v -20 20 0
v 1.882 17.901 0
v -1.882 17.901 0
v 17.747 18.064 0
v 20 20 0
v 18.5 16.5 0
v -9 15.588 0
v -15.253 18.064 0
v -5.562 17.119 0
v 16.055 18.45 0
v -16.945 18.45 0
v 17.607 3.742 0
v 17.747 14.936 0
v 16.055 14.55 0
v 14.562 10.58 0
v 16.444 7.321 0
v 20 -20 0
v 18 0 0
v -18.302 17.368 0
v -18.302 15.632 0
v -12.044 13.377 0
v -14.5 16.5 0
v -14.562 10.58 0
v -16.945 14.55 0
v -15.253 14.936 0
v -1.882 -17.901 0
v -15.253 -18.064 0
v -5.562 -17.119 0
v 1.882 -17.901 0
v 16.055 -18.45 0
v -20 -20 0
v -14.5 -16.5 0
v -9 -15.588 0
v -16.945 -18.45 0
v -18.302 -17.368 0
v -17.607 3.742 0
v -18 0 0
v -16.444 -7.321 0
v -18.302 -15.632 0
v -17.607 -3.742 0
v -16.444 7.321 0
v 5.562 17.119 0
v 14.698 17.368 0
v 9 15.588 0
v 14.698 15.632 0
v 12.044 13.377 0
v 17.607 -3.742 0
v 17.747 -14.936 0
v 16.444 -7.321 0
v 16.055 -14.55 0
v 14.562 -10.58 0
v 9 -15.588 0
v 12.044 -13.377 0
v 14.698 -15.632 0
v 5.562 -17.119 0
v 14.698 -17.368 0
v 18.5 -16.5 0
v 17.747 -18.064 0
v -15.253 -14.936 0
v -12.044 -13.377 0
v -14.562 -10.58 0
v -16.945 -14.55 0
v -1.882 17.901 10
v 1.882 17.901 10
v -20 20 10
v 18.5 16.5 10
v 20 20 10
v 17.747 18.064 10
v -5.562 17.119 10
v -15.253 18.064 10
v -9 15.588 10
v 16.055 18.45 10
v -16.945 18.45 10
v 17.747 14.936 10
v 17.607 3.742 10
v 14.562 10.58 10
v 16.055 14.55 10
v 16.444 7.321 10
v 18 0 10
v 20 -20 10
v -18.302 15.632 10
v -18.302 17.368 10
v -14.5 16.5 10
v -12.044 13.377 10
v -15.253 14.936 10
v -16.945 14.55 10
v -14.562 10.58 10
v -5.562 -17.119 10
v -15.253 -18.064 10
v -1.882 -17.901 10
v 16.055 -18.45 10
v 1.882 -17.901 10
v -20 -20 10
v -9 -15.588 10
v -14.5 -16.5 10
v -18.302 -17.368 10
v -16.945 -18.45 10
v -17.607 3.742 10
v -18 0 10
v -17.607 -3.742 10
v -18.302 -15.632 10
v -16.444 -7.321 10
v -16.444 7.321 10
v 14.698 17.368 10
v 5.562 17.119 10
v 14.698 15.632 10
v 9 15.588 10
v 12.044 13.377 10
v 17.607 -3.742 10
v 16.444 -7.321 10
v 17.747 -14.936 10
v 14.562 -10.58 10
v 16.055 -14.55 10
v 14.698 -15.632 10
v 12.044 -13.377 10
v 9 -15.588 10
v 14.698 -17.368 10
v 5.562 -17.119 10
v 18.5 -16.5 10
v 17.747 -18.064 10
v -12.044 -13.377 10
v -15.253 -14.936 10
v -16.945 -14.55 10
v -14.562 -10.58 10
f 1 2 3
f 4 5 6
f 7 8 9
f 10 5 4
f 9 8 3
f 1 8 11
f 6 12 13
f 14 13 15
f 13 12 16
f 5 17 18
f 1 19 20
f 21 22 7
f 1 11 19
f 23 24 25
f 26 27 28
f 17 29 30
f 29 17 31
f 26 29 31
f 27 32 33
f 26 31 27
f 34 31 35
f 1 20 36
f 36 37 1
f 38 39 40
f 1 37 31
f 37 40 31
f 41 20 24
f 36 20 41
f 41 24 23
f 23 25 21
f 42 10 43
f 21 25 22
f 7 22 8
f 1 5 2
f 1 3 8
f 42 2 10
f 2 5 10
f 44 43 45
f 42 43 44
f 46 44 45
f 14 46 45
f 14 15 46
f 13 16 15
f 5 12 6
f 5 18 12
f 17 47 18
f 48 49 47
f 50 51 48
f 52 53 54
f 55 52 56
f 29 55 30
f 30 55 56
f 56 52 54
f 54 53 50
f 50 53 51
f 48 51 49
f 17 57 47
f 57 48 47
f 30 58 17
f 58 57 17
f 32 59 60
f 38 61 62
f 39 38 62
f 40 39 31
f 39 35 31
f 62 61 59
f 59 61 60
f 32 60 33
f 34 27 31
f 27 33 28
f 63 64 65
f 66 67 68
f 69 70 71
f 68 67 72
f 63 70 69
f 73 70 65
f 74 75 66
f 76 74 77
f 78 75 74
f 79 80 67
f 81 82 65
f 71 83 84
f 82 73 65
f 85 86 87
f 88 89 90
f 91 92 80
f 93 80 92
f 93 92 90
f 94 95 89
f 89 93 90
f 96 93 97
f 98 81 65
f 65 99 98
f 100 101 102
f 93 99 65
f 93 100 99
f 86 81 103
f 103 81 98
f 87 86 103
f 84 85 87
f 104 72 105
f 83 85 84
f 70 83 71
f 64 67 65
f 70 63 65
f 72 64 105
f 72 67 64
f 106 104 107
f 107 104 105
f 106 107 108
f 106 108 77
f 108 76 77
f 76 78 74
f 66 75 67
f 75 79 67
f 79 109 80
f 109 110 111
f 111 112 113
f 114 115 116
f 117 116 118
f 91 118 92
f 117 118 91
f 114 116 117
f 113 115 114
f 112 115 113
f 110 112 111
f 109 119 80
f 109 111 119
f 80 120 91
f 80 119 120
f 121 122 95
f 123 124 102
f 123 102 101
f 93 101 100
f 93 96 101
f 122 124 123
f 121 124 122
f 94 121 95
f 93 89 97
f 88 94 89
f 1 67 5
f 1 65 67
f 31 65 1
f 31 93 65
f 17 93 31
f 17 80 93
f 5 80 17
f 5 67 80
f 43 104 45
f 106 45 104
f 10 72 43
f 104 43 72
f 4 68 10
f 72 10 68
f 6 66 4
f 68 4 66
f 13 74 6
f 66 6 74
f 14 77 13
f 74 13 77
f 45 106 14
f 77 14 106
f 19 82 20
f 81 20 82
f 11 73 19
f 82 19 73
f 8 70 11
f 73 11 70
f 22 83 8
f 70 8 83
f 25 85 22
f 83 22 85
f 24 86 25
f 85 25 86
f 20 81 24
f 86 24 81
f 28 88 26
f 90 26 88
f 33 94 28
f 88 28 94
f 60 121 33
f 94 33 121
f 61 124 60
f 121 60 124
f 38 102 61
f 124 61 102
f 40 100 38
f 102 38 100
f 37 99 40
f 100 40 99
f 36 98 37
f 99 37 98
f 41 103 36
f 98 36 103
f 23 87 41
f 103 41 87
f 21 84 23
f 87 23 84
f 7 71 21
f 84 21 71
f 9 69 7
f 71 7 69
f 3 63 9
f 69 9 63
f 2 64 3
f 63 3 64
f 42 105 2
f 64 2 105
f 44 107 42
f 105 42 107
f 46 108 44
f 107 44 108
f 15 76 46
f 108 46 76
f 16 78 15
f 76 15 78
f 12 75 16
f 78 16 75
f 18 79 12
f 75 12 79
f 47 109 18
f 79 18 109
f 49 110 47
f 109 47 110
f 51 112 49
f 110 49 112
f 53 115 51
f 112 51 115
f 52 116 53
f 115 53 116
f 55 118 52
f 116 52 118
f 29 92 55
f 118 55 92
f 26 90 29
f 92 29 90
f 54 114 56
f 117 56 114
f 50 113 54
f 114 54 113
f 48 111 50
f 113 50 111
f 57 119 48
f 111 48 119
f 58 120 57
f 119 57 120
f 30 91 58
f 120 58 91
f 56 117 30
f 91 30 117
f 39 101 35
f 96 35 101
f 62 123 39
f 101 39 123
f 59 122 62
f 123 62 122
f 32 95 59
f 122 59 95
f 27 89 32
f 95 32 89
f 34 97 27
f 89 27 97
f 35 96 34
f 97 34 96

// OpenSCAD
echo(version=version());

color("gray")

        linear_extrude(height = 10)
        difference(){
            square([40, 40], center = true);
            circle(18, center = true);
            translate([16.5, -16.5, 0])circle(2, center = true);
            translate([16.5, 16.5, 0])circle(2, center = true);
            translate([-16.5, 16.5, 0])circle(2, center = true);
            translate([-16.5, -16.5, 0])circle(2, center = true);
        }
